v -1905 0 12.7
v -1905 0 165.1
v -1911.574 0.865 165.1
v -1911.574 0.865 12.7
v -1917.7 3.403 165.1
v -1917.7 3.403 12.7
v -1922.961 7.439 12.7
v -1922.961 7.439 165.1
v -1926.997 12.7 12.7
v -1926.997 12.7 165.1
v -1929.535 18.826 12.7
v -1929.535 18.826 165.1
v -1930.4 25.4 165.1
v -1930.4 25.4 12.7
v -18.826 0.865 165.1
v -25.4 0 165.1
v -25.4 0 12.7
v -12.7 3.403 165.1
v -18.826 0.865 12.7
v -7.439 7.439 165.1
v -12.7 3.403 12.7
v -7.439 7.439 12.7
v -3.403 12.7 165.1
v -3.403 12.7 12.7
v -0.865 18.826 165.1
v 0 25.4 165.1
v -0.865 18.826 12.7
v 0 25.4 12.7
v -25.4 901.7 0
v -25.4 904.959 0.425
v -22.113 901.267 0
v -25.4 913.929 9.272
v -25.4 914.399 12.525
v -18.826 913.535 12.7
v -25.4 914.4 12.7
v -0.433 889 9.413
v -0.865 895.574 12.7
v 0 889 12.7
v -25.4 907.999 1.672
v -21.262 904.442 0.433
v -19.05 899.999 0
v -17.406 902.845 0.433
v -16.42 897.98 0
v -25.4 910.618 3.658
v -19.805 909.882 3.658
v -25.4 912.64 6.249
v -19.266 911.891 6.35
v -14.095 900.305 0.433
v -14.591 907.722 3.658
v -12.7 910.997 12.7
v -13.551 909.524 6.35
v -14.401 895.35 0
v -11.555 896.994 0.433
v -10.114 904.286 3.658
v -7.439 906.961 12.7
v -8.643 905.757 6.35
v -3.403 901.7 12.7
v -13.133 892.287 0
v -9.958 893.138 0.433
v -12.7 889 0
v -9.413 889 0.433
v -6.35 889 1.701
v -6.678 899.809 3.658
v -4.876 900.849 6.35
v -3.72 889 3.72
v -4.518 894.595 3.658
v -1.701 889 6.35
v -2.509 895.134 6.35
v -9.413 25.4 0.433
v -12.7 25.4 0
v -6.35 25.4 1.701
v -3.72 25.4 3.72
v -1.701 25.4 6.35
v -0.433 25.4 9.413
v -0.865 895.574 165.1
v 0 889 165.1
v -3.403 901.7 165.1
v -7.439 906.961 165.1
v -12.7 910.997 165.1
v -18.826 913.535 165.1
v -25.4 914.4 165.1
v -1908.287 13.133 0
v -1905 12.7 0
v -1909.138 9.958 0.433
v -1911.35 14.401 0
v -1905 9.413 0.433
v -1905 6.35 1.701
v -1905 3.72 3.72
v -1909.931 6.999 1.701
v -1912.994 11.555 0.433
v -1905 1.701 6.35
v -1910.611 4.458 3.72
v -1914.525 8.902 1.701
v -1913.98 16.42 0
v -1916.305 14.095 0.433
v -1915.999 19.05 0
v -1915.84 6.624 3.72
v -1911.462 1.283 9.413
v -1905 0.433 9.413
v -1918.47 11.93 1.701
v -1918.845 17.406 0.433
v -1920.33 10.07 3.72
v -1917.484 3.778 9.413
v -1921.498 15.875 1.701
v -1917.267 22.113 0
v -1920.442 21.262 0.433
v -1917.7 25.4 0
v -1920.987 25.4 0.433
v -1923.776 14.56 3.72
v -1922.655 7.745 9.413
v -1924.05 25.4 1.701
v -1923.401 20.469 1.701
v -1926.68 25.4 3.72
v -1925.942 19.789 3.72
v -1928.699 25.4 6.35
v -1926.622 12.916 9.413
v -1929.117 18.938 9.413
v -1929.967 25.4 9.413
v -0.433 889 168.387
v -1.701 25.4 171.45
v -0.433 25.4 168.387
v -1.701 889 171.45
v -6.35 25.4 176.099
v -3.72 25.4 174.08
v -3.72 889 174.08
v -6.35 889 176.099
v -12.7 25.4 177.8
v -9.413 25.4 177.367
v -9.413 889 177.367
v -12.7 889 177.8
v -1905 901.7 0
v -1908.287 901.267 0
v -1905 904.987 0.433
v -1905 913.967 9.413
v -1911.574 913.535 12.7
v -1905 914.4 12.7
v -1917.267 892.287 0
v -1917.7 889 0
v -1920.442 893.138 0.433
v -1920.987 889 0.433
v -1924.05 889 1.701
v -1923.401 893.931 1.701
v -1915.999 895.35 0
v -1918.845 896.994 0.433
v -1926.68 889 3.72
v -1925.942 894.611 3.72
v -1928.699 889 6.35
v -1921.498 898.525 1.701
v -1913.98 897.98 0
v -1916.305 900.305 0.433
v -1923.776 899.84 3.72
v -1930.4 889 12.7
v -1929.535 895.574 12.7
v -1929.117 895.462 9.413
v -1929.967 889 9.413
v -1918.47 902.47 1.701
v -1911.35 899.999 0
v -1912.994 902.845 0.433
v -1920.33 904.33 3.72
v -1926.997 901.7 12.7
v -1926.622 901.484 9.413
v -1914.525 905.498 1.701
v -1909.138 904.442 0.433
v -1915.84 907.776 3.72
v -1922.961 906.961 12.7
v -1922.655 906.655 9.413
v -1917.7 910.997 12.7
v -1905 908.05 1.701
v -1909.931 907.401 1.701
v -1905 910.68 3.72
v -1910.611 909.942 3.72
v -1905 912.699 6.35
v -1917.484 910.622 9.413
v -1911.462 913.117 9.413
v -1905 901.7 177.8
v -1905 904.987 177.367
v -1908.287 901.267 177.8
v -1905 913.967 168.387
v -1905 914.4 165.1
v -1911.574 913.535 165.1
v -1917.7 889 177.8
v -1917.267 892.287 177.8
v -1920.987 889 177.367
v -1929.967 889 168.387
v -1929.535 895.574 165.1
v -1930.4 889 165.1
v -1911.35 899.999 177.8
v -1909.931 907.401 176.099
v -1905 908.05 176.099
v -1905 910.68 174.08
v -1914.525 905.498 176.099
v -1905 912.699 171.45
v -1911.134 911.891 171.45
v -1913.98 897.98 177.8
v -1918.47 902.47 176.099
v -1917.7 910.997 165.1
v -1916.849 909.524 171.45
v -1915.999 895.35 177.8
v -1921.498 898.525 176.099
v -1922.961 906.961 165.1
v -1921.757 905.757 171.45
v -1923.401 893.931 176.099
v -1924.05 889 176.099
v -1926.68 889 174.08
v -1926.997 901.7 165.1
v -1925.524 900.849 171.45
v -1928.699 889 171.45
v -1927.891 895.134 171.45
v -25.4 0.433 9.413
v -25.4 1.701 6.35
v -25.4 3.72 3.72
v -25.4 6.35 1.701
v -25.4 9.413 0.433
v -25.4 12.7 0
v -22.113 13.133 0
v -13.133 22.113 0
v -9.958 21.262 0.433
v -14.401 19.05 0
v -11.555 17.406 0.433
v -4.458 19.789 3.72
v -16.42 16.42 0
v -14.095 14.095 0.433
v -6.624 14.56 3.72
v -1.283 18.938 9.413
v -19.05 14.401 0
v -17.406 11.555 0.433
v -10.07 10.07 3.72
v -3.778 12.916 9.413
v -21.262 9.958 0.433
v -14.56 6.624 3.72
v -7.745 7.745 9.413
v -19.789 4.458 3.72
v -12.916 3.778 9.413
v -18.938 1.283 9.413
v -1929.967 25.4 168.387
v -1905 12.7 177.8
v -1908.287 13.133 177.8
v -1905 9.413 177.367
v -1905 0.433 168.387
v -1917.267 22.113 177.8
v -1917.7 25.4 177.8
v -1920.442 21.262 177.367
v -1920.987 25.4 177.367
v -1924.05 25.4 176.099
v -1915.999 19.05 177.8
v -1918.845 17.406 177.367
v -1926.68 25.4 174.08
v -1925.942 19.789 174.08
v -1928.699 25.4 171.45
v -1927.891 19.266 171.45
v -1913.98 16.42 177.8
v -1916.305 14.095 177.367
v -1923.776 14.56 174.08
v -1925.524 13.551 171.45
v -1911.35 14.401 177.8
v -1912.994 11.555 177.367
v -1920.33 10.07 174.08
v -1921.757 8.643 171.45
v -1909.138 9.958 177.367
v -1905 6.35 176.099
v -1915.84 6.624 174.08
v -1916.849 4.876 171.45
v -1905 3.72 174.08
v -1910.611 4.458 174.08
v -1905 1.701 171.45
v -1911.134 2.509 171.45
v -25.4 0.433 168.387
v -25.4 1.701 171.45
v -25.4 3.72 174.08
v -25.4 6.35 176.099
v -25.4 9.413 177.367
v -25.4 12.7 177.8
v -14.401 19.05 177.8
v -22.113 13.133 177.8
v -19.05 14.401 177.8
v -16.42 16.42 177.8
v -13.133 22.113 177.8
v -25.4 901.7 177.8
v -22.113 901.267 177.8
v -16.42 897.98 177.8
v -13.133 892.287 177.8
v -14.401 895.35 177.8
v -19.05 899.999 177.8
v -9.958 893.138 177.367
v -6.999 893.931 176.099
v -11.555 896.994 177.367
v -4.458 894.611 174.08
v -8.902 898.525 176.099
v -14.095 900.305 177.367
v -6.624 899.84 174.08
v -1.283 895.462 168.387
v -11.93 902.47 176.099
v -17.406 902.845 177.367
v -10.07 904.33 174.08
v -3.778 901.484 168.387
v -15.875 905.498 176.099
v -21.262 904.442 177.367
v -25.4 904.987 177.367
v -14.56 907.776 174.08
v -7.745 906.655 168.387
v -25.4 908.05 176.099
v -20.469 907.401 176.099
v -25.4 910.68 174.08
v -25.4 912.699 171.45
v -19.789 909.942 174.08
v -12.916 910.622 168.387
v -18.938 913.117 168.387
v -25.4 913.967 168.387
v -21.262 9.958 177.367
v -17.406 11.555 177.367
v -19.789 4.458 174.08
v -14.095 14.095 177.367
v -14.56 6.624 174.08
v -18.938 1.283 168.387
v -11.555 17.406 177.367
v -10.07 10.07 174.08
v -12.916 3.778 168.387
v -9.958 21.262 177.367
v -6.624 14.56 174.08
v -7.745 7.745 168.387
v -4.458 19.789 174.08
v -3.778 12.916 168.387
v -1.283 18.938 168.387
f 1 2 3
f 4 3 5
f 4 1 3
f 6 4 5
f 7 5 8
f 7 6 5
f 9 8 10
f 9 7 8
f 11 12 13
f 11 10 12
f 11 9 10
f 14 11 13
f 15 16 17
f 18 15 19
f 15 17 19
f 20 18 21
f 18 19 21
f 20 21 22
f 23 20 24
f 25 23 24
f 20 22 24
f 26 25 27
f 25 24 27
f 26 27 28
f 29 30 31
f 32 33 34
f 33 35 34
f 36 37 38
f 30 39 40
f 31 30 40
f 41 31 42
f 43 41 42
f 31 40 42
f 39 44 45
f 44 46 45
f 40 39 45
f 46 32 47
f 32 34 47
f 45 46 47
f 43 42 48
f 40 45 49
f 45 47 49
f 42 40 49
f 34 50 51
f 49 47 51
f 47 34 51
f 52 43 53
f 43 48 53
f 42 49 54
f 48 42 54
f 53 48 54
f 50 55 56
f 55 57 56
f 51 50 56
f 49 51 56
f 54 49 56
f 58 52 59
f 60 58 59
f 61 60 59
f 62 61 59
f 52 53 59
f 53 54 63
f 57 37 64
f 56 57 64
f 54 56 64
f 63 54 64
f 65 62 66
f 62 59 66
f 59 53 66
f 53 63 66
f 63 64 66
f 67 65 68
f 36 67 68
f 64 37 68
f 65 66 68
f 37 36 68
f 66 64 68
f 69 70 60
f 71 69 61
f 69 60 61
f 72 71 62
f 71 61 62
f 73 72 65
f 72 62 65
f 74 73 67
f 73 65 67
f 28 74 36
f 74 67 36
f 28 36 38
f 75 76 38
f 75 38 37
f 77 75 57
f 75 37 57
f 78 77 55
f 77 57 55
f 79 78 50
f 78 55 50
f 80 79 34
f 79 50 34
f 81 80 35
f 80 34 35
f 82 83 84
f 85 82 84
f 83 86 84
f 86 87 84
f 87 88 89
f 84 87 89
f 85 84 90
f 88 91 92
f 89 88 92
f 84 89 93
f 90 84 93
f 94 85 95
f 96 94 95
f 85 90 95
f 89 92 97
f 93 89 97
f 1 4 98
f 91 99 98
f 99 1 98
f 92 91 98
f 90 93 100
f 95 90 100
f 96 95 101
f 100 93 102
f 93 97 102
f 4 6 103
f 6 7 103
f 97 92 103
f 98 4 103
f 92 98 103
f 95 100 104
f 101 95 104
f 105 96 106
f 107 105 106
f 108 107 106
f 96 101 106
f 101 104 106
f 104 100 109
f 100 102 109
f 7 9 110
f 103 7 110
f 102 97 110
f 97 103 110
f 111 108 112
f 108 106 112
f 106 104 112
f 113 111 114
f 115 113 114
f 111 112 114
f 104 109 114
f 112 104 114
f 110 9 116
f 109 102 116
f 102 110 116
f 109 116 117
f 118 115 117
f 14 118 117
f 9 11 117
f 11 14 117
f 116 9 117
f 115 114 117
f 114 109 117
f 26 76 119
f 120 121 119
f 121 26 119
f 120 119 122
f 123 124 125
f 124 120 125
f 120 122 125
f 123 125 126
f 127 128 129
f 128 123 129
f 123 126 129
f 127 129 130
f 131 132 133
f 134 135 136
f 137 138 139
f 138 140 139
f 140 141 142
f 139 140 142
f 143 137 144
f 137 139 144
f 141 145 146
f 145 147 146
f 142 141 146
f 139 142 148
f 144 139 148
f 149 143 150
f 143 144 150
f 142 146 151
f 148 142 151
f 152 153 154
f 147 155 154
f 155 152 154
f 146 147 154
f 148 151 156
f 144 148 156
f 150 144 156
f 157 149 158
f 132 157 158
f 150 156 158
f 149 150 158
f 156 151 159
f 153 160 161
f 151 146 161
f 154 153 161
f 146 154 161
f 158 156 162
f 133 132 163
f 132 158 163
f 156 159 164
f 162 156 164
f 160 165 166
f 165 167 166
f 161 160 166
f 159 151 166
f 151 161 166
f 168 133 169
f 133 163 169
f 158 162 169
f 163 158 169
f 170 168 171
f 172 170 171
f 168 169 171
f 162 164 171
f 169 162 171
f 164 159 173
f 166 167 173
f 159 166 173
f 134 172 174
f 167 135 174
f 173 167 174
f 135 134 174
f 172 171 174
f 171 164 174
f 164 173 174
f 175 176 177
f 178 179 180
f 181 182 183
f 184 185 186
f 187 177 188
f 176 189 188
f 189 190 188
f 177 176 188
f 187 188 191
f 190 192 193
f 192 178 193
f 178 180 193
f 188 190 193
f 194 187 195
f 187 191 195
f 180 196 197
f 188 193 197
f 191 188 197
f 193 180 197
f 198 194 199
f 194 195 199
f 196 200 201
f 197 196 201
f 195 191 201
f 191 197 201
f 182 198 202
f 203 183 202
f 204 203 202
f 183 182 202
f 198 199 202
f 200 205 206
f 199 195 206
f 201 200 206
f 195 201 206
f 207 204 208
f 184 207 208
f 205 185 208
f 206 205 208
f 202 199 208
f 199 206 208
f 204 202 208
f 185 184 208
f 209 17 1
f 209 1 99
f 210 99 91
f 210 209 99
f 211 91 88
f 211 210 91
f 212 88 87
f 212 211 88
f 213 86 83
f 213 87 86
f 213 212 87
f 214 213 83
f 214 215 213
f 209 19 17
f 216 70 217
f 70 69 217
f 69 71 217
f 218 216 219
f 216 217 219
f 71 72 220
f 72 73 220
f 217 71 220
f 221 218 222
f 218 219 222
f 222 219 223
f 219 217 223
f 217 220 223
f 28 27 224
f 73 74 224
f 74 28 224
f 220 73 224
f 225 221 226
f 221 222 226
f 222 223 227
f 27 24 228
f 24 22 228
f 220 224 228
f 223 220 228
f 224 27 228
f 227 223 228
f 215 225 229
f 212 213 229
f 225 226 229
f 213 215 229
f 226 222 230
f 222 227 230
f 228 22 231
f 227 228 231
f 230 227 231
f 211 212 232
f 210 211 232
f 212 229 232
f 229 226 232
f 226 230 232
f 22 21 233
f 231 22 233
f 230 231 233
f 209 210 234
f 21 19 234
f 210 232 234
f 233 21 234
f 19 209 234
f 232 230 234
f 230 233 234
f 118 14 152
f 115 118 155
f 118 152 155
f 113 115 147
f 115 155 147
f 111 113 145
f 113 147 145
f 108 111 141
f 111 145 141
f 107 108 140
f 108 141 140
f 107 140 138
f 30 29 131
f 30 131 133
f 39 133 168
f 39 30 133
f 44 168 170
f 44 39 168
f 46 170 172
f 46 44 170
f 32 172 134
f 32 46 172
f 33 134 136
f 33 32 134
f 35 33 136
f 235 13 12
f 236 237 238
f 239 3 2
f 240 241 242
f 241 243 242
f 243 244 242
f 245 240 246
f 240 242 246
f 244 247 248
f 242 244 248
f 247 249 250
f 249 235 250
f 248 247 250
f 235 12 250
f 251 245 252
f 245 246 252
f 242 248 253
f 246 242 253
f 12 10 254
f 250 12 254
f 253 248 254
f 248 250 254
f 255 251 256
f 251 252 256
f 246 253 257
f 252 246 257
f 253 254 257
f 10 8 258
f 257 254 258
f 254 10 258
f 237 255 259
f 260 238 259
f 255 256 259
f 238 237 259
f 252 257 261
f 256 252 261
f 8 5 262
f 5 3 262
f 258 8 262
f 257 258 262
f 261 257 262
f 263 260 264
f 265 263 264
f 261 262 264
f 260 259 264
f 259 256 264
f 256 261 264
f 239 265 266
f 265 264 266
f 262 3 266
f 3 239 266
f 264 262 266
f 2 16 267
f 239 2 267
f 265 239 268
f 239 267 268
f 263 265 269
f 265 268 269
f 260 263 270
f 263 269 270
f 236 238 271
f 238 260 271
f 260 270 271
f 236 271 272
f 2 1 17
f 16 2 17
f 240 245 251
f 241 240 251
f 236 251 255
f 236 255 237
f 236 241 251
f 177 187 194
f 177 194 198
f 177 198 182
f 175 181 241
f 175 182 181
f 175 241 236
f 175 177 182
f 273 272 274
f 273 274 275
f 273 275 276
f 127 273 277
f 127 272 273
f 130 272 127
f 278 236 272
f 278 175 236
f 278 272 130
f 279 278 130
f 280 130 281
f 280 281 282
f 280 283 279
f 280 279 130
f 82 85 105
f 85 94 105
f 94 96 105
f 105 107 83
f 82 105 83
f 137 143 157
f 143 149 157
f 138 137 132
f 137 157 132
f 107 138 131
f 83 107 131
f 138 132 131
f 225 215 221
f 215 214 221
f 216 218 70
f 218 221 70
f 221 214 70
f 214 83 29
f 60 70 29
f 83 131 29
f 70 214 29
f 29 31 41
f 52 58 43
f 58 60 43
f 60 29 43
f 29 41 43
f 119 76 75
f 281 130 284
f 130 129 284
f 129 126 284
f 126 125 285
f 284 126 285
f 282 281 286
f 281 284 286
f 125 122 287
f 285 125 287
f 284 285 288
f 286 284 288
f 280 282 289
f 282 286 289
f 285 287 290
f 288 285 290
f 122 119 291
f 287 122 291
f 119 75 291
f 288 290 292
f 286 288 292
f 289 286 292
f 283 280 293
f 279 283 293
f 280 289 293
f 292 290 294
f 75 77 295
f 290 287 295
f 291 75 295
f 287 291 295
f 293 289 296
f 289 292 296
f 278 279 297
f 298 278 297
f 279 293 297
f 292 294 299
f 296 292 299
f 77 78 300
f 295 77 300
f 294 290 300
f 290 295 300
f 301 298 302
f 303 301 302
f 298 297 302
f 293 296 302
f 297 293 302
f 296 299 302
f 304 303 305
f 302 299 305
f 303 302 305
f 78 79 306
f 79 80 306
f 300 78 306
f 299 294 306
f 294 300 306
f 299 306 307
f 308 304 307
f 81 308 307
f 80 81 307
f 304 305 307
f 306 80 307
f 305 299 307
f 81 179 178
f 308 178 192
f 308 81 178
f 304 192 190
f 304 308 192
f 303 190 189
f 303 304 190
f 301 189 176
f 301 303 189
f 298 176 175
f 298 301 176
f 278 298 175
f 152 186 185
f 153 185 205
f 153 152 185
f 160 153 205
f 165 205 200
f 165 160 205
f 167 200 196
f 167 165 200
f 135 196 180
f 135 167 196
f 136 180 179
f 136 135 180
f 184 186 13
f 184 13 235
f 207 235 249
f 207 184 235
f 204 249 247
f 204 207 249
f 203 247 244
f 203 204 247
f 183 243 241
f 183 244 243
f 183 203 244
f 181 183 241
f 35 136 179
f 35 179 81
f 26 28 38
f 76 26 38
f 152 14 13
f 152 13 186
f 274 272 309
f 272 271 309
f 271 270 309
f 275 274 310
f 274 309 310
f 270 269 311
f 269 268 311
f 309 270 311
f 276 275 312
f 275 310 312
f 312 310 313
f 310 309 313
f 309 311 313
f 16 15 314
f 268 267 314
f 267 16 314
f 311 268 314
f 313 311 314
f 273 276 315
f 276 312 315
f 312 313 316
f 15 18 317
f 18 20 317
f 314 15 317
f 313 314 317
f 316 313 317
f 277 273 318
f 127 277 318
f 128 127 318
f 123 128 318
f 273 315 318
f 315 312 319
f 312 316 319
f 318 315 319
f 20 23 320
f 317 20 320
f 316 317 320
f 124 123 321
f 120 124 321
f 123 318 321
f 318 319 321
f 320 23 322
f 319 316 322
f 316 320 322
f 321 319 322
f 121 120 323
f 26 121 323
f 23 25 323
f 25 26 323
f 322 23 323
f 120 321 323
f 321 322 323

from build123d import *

# Parameters (mm, degrees)
F0_W         = 1930.4
F0_H         = 914.4
F1_DEPTH     = 177.8
F2_R         = 12.7
F3_R         = 12.7
F4_T1_DEPTH  = 177.8
F4_T4_ANGLE  = 90
F4_T6_ANGLE  = 90
F4_T8_ANGLE  = 90
F4_T10_ANGLE = 90
F4_T12_ANGLE = 90
F4_T14_ANGLE = 90
F4_T16_ANGLE = 90
F4_T18_ANGLE = 90


# Not quite as in the source:
# - a fillet or chamfer that OpenCascade refuses, or shapes differently, is made with other operations: its cross-section is extruded or revolved along the edge and cut away or added


with BuildPart() as f1:
    # F0 (on Top) → F1 (new body)
    with BuildSketch(Plane.XY):
        with Locations((-965.2, 457.2)):
            Rectangle(F0_W, F0_H)
    extrude(amount=F1_DEPTH)

    # F2
    f2_edges = [f1.edges().sort_by_distance(p)[0] for p in [
        (-965.2, 0, 177.8),
        (0, 457.2, 177.8),
        (-965.2, 914.4, 177.8),
        (-1930.4, 457.2, 177.8),
    ]]
    fillet(f2_edges, radius=F2_R)

    # F3
    f3_edges = [f1.edges().sort_by_distance(p)[0] for p in [
        (-965.2, 0, 0),
        (0, 457.2, 0),
        (-965.2, 914.4, 0),
        (-1930.4, 457.2, 0),
    ]]
    fillet(f3_edges, radius=F3_R)

    # F4: fillet of radius 25.4 on 4 edges, made by hand

    # F4_s2 → F4_t1 (cut)
    with BuildSketch(Plane.XY):
        with BuildLine():
            ThreePointArc((-1930.4, 889), (-1922.9605122421, 906.9605122421), (-1905, 914.4))
            Line((-1905, 914.4), (-1930.4, 914.4))
            Line((-1930.4, 914.4), (-1930.4, 889))
        make_face()
        with BuildLine():
            ThreePointArc((-1905, 0), (-1922.9605122421, 7.4394877579), (-1930.4, 25.4))
            Line((-1930.4, 25.4), (-1930.4, 0))
            Line((-1930.4, 0), (-1905, 0))
        make_face()
        with BuildLine():
            ThreePointArc((-25.4, 0), (-7.4394877579, 7.4394877579), (0, 25.4))
            Line((0, 25.4), (0, 0))
            Line((0, 0), (-25.4, 0))
        make_face()
        with BuildLine():
            ThreePointArc((0, 889), (-7.4394877579, 906.9605122421), (-25.4, 914.4))
            Line((-25.4, 914.4), (0, 914.4))
            Line((0, 914.4), (0, 889))
        make_face()
    extrude(amount=F4_T1_DEPTH, mode=Mode.SUBTRACT)

    # F4_s3 → F4_t4 (revolve, cut)
    with BuildSketch(Plane.YZ.offset(-25.4)):
        with BuildLine():
            ThreePointArc((901.7, 0), (910.6802561211, 3.7197438789), (914.4, 12.7))
            Line((914.4, 12.7), (914.4, 0))
            Line((914.4, 0), (901.7, 0))
        make_face()
    revolve(axis=Axis((-25.4, 889, 0), (0, 0, -1)), revolution_arc=F4_T4_ANGLE, mode=Mode.SUBTRACT)

    # F4_s5 → F4_t6 (revolve, cut)
    with BuildSketch(Plane.XZ.offset(-889)):
        with BuildLine():
            ThreePointArc((-12.7, 177.8), (-3.7197438789, 174.0802561211), (0, 165.1))
            Line((0, 165.1), (0, 177.8))
            Line((0, 177.8), (-12.7, 177.8))
        make_face()
    revolve(axis=Axis((-25.4, 889, 177.8), (0, 0, 1)), revolution_arc=F4_T6_ANGLE, mode=Mode.SUBTRACT)

    # F4_s7 → F4_t8 (revolve, cut)
    with BuildSketch(Plane.XZ.offset(-25.4)):
        with BuildLine():
            ThreePointArc((-12.7, 0), (-3.7197438789, 3.7197438789), (0, 12.7))
            Line((0, 12.7), (0, 0))
            Line((0, 0), (-12.7, 0))
        make_face()
    revolve(axis=Axis((-25.4, 25.4, 0), (0, 0, -1)), revolution_arc=F4_T8_ANGLE, mode=Mode.SUBTRACT)

    # F4_s9 → F4_t10 (revolve, cut)
    with BuildSketch(Plane.YZ.offset(-25.4)):
        with BuildLine():
            ThreePointArc((12.7, 177.8), (3.7197438789, 174.0802561211), (0, 165.1))
            Line((0, 165.1), (0, 177.8))
            Line((0, 177.8), (12.7, 177.8))
        make_face()
    revolve(axis=Axis((-25.4, 25.4, 177.8), (0, 0, 1)), revolution_arc=F4_T10_ANGLE, mode=Mode.SUBTRACT)

    # F4_s11 → F4_t12 (revolve, cut)
    with BuildSketch(Plane.YZ.offset(-1905)):
        with BuildLine():
            ThreePointArc((12.7, 0), (3.7197438789, 3.7197438789), (0, 12.7))
            Line((0, 12.7), (0, 0))
            Line((0, 0), (12.7, 0))
        make_face()
    revolve(axis=Axis((-1905, 25.4, 0), (0, 0, -1)), revolution_arc=F4_T12_ANGLE, mode=Mode.SUBTRACT)

    # F4_s13 → F4_t14 (revolve, cut)
    with BuildSketch(Plane.XZ.offset(-25.4)):
        with BuildLine():
            ThreePointArc((-1917.7, 177.8), (-1926.6802561211, 174.0802561211), (-1930.4, 165.1))
            Line((-1930.4, 165.1), (-1930.4, 177.8))
            Line((-1930.4, 177.8), (-1917.7, 177.8))
        make_face()
    revolve(axis=Axis((-1905, 25.4, 177.8), (0, 0, 1)), revolution_arc=F4_T14_ANGLE, mode=Mode.SUBTRACT)

    # F4_s15 → F4_t16 (revolve, cut)
    with BuildSketch(Plane.XZ.offset(-889)):
        with BuildLine():
            ThreePointArc((-1917.7, 0), (-1926.6802561211, 3.7197438789), (-1930.4, 12.7))
            Line((-1930.4, 12.7), (-1930.4, 0))
            Line((-1930.4, 0), (-1917.7, 0))
        make_face()
    revolve(axis=Axis((-1905, 889, 0), (0, 0, -1)), revolution_arc=F4_T16_ANGLE, mode=Mode.SUBTRACT)

    # F4_s17 → F4_t18 (revolve, cut)
    with BuildSketch(Plane.YZ.offset(-1905)):
        with BuildLine():
            ThreePointArc((901.7, 177.8), (910.6802561211, 174.0802561211), (914.4, 165.1))
            Line((914.4, 165.1), (914.4, 177.8))
            Line((914.4, 177.8), (901.7, 177.8))
        make_face()
    revolve(axis=Axis((-1905, 889, 177.8), (0, 0, 1)), revolution_arc=F4_T18_ANGLE, mode=Mode.SUBTRACT)


solid = f1.part
